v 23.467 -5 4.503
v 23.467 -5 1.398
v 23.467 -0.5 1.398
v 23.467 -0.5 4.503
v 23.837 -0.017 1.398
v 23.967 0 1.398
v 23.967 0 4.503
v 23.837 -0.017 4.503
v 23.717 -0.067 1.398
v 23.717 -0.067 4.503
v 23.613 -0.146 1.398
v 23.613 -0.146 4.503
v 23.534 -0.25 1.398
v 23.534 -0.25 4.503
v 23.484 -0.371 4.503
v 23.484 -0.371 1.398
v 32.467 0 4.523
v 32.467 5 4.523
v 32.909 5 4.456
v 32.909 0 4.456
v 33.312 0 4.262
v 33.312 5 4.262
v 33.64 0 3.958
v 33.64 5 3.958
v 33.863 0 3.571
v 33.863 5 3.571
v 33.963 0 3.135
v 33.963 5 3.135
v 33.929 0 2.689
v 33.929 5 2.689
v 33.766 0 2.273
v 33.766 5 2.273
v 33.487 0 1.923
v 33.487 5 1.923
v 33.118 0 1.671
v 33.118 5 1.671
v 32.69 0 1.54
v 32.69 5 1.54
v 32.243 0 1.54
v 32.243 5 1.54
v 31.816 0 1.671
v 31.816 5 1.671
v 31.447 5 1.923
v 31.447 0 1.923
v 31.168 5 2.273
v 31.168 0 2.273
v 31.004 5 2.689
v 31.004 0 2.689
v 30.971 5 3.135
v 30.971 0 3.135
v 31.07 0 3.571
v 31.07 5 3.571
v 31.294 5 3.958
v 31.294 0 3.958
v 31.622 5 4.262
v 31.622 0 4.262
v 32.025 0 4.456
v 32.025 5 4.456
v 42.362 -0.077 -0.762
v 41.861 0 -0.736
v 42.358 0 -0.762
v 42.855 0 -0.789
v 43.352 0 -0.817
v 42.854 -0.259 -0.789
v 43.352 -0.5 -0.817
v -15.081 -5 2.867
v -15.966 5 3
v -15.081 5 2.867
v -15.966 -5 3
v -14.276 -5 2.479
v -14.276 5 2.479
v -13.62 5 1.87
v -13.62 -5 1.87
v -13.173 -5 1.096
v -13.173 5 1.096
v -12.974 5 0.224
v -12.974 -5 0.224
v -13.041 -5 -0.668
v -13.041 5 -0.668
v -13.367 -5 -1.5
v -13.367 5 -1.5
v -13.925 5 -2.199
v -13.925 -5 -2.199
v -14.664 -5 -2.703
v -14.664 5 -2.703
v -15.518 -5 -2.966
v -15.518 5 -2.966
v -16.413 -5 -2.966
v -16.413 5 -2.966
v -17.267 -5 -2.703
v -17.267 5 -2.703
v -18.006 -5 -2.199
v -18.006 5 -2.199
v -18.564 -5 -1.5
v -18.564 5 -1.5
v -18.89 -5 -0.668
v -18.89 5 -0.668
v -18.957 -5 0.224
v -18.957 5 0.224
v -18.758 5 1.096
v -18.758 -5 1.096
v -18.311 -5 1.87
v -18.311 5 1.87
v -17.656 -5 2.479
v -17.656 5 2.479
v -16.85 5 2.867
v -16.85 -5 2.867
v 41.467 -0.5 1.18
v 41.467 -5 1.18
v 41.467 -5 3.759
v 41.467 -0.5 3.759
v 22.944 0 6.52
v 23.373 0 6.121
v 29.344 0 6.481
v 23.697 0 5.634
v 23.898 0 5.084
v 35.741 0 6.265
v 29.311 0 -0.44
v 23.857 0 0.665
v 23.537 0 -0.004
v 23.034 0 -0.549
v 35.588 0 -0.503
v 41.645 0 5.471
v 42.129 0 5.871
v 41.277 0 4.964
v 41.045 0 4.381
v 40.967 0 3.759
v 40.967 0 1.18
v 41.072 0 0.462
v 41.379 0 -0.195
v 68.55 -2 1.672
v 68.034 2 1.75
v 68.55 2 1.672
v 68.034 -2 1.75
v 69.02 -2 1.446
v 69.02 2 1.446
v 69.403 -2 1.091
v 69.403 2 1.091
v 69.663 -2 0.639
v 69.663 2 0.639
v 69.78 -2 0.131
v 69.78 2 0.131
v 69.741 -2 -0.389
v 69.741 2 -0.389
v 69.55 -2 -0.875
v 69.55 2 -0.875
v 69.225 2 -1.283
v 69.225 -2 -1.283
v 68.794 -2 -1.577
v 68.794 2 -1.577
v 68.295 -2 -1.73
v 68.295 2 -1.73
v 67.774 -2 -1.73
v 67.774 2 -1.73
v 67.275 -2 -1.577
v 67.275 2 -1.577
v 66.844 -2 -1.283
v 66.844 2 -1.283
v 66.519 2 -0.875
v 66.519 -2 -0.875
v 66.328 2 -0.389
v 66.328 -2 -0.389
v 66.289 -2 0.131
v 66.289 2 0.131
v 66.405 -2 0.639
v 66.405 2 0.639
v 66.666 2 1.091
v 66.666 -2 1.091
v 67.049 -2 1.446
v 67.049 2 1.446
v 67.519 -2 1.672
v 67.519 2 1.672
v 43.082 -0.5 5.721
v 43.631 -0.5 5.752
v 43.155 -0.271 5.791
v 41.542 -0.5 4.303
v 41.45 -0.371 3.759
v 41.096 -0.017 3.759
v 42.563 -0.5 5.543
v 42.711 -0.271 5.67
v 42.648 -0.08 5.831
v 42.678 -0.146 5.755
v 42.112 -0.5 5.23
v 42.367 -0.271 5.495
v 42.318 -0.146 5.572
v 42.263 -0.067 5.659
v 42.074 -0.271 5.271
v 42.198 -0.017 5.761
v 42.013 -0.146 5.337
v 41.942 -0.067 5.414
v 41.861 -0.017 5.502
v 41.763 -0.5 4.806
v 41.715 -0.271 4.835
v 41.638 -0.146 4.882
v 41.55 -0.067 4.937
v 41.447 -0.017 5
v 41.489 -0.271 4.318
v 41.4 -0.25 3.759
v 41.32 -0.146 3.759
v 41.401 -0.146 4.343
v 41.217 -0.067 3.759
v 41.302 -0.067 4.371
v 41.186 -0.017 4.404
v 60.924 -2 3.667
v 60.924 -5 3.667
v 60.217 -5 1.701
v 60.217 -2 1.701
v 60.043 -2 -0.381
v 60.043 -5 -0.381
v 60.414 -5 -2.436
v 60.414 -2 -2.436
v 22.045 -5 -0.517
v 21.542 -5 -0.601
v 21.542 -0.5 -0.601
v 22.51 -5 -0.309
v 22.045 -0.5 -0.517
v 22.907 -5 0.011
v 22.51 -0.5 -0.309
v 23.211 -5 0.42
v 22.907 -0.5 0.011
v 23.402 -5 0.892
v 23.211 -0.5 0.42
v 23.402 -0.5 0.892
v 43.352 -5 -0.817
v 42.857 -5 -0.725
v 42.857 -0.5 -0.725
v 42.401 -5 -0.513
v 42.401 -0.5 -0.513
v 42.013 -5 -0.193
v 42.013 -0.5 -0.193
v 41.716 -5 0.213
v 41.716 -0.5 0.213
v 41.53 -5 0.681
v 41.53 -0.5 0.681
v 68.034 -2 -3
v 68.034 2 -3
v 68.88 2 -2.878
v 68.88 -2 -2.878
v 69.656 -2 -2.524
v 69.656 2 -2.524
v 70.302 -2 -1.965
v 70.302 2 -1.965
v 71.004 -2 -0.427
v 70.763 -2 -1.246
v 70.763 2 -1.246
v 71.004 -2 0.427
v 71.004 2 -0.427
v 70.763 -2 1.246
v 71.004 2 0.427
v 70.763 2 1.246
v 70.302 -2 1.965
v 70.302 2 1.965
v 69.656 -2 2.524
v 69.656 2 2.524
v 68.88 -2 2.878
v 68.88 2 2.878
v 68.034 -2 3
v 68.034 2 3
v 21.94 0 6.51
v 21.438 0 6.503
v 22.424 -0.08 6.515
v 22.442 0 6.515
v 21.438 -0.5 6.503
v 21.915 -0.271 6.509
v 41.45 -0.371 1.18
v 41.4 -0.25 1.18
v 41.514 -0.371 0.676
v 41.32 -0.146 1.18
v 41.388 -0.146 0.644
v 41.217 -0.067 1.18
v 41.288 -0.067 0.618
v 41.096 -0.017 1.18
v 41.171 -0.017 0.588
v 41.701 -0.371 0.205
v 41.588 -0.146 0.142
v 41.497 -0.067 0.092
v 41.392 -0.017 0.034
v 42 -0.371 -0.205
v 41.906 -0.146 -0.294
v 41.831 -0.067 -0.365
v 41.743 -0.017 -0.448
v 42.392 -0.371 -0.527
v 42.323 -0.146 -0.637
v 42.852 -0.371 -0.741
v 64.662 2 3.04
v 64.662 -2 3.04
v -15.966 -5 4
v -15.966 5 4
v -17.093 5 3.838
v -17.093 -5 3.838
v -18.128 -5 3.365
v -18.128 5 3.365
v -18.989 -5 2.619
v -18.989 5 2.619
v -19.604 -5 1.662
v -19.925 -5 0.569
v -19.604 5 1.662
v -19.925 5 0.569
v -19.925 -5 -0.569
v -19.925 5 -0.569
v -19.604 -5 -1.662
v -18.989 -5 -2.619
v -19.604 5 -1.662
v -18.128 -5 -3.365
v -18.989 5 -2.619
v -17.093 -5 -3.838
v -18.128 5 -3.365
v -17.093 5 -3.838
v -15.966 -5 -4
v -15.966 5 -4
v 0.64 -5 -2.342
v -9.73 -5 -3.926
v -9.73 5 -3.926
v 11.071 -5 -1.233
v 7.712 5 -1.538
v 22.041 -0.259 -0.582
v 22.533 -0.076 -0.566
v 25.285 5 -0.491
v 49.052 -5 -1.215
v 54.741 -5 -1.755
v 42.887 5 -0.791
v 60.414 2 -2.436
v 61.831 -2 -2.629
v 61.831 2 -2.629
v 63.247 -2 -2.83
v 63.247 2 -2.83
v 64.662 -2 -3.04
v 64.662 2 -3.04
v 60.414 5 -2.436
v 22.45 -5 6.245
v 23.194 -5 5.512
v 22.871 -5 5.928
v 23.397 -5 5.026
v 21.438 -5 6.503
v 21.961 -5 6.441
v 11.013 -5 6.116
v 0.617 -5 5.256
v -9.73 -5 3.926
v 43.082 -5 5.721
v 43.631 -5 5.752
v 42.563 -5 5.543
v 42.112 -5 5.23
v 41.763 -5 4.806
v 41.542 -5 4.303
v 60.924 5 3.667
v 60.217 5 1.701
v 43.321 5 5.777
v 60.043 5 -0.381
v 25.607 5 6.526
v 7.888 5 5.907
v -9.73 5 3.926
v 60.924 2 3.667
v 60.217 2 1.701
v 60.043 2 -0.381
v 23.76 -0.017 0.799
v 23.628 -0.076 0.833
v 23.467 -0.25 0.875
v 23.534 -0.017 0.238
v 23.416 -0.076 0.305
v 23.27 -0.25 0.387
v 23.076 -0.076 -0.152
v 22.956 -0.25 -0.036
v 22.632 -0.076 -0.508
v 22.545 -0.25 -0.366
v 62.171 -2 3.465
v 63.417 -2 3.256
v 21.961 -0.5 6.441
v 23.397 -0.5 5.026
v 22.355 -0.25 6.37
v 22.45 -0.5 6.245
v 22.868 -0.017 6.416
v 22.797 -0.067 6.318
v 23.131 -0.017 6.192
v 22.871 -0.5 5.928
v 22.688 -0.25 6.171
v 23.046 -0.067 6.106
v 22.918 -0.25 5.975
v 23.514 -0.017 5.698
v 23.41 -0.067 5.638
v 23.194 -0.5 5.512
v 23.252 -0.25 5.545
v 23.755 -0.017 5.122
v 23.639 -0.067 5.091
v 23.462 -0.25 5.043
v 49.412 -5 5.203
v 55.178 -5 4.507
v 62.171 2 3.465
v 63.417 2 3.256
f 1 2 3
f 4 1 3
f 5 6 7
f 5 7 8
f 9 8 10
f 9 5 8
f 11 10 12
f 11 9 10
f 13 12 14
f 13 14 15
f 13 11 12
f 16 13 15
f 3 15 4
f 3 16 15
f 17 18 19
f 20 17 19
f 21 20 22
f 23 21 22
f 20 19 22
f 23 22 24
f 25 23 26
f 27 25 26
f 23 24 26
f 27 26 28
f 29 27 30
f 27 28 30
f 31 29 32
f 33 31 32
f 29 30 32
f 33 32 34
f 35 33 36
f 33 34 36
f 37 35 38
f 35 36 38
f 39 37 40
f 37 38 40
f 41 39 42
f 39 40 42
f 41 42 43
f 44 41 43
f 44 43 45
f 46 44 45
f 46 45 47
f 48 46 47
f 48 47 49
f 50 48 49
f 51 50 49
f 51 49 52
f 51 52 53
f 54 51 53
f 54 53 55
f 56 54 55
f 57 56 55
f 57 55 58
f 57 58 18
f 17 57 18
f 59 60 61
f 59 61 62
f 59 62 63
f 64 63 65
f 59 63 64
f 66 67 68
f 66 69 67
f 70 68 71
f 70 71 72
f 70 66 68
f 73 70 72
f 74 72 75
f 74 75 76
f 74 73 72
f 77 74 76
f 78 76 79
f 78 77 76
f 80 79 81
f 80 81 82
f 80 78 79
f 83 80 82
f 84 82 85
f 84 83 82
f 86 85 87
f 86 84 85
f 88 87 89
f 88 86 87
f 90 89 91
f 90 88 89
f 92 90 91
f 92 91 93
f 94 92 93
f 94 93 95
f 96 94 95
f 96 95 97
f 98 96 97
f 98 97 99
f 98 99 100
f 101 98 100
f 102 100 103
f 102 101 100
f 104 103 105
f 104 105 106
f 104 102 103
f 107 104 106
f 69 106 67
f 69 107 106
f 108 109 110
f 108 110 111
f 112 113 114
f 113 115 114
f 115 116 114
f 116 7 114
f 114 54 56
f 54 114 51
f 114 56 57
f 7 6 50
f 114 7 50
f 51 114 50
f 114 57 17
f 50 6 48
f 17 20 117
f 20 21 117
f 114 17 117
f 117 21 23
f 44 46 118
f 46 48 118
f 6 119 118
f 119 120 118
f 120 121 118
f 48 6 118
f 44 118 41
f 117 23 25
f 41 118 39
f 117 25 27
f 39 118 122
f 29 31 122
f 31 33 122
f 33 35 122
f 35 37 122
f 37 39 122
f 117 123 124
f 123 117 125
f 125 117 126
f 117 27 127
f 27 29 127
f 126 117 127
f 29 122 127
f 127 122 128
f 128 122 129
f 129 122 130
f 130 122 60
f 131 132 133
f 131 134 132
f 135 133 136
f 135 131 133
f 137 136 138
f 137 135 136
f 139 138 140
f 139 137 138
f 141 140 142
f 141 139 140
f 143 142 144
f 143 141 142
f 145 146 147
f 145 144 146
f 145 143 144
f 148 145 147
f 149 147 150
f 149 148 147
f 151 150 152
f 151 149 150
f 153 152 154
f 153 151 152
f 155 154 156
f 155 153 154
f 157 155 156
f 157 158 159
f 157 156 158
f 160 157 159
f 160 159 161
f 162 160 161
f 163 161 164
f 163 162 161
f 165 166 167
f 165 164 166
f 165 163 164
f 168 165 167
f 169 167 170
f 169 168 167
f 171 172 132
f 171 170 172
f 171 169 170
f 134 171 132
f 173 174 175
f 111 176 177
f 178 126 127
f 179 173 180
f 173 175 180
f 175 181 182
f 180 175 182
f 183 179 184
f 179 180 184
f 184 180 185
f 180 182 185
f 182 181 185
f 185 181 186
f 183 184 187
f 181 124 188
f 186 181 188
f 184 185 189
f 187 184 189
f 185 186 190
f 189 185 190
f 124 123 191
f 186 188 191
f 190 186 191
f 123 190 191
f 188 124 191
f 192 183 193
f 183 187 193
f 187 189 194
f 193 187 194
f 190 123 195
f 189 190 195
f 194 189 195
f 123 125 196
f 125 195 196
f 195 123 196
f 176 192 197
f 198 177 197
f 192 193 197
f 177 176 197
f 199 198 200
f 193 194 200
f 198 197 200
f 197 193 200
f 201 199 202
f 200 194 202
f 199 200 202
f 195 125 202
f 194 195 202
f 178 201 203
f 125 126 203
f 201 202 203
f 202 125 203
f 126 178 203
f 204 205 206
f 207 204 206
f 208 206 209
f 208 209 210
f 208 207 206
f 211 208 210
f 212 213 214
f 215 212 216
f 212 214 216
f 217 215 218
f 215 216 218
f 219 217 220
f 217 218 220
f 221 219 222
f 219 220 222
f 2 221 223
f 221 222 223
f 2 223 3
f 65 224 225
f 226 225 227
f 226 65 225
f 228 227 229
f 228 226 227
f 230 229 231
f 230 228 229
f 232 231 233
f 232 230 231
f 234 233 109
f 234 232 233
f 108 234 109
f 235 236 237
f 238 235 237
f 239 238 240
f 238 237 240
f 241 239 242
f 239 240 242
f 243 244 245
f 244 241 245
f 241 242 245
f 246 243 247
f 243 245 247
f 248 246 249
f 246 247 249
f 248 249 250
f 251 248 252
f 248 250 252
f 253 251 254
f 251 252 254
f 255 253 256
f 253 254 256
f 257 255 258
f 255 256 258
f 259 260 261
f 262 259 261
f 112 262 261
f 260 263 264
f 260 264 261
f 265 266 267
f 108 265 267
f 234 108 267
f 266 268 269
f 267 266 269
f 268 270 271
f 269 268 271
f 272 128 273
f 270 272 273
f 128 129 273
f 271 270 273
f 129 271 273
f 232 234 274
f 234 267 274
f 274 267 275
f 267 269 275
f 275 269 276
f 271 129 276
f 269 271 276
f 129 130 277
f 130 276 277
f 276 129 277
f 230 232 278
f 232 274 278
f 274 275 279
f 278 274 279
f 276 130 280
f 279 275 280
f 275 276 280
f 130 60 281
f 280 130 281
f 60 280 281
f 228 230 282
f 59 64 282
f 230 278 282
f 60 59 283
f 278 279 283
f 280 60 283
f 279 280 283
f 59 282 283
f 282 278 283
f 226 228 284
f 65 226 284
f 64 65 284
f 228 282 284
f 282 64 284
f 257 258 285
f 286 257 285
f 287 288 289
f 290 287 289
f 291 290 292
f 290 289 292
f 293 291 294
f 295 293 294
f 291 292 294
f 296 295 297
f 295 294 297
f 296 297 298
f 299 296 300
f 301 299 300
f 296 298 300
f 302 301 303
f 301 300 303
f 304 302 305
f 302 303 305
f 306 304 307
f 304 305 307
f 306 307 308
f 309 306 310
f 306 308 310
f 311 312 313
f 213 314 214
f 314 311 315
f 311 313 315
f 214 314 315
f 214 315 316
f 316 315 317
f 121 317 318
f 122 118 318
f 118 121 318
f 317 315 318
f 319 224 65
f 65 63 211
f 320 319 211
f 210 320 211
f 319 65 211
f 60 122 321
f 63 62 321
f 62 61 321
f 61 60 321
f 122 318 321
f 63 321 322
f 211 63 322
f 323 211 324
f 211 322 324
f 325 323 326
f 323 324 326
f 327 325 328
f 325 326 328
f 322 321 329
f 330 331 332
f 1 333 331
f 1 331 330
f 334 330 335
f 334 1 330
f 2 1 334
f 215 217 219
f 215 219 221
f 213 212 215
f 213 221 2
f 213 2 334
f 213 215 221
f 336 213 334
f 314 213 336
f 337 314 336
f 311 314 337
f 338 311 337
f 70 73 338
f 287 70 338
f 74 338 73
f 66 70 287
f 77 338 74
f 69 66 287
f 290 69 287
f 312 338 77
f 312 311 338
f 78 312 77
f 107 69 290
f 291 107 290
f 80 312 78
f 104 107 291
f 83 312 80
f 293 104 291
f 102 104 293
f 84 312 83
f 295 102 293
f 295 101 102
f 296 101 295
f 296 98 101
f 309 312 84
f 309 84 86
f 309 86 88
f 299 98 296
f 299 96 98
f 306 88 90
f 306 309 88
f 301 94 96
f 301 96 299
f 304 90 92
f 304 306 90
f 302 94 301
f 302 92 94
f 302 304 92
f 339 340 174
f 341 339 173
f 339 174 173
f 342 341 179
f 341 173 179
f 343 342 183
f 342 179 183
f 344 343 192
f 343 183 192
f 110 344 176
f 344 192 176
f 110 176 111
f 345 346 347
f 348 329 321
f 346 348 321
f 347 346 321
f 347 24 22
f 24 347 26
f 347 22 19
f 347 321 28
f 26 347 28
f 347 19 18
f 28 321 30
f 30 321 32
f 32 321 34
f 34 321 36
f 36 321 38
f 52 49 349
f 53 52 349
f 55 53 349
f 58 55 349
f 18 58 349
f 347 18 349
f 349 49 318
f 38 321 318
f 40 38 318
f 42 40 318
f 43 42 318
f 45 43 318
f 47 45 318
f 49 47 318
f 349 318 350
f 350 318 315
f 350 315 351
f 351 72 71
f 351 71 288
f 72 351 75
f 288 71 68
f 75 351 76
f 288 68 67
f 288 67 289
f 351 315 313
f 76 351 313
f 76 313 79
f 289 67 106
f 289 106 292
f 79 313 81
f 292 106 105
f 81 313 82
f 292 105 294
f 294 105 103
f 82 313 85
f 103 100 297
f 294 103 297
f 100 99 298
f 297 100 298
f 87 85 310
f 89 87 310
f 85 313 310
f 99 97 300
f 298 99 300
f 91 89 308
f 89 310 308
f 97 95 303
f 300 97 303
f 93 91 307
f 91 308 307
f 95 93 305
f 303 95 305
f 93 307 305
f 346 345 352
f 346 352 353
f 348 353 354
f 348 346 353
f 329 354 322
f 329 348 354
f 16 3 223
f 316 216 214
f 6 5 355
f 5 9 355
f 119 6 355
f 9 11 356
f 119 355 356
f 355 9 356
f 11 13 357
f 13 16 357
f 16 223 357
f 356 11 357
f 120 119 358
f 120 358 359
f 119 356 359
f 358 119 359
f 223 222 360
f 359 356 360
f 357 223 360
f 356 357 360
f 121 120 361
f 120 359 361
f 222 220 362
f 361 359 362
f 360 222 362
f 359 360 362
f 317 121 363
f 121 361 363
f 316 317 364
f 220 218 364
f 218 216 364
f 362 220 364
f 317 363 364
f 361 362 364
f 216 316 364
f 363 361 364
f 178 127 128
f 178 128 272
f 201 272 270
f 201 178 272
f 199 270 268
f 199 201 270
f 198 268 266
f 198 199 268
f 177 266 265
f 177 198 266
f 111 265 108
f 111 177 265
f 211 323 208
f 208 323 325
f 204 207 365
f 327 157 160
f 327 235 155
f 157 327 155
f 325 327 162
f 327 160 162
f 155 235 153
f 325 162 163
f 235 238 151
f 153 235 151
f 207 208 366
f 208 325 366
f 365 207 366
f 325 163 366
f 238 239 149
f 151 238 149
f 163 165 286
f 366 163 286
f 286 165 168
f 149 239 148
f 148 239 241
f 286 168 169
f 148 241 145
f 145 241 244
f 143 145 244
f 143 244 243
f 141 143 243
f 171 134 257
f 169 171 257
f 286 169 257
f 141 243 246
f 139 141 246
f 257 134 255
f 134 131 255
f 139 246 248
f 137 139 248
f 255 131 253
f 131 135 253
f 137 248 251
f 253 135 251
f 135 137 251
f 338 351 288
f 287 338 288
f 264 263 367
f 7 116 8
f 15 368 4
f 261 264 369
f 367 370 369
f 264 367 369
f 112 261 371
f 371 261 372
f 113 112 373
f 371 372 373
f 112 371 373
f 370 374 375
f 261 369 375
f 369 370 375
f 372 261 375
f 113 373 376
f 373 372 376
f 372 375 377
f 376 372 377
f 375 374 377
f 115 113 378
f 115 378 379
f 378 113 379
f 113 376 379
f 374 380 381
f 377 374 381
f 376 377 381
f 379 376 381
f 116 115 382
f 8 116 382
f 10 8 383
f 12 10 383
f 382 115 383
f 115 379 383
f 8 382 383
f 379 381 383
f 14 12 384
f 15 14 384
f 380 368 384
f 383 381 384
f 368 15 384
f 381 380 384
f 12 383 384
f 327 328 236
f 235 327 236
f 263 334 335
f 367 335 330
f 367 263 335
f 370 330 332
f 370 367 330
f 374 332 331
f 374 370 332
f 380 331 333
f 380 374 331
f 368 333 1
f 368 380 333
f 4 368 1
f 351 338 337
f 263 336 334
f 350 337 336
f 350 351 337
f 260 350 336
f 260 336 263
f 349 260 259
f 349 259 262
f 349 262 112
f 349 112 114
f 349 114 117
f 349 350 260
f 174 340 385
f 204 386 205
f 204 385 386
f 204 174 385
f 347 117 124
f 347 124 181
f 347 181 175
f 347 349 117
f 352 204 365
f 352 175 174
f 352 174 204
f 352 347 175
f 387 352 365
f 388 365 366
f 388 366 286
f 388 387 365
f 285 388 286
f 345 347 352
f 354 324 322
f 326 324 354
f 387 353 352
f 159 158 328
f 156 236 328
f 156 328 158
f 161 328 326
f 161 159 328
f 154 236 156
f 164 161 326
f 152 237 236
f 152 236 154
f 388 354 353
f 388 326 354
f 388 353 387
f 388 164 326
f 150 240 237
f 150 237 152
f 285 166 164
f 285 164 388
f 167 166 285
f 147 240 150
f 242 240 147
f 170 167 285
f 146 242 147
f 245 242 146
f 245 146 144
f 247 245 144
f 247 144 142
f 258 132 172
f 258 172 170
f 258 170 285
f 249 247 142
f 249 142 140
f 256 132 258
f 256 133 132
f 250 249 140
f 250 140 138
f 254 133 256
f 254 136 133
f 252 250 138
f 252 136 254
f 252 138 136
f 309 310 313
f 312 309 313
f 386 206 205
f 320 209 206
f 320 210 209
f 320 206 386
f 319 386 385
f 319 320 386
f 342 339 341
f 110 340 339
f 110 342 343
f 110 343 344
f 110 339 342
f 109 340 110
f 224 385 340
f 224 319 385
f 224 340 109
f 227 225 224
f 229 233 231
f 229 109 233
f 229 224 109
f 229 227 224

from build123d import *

# Parameters (mm, degrees)
SKETCH1_R               = 3
SKETCH1_R_2             = 1.75
BOSS_EXTRUDE1_DEPTH     = 5
SKETCH3_W               = 8
SKETCH3_H               = 3
SKETCH3_H_2             = 4.010495491
SKETCH4_R               = 1.5
CUT_EXTRUDE1_DEPTH      = 10
CUT_EXTRUDE3_DEPTH      = 72.508687789
CUT_EXTRUDE3_DEPTH_BACK = 72.508687789
SKETCH7_W               = 18
SKETCH7_H               = 5
FILLET2_R               = 2
FILLET3_R               = 0.5


with BuildPart() as part:
    # Sketch1 → Boss-Extrude1 (new, symmetric)
    with BuildSketch(Plane(origin=(0, 0, 0), x_dir=(1, 0, 0), z_dir=(0, 1, 0))):
        with BuildLine():
            Line((-9.729992932, 3.92576688), (-15.965575011, 4))
            ThreePointArc((-15.965575011, 4), (-19.965575011, 0), (-15.965575011, -4))
            Line((-15.965575011, -4), (-9.729992932, -3.92576688))
            ThreePointArc((-9.729992932, -3.92576688), (27.50198709, -6.510792927), (64.661875809, -3.040149395))
            Line((64.661875809, -3.040149395), (68.034424989, -3))
            ThreePointArc((68.034424989, -3), (71.034424989, 0), (68.034424989, 3))
            Line((68.034424989, 3), (64.661875809, 3.040149395))
            ThreePointArc((64.661875809, 3.040149395), (27.429895786, 0.455123348), (-9.729992932, 3.92576688))
        make_face()
        with Locations((-15.965575011, 0)):
            Circle(SKETCH1_R, mode=Mode.SUBTRACT)
        with Locations((68.034424989, 0)):
            Circle(SKETCH1_R_2, mode=Mode.SUBTRACT)
    extrude(amount=BOSS_EXTRUDE1_DEPTH, both=True)

    # Sketch3 → Cut-Revolve1 (revolve, cut)
    with BuildSketch(Plane(origin=(68.034424989, 0, 0), x_dir=(0, 0, -1), z_dir=(1, 0, 0))):
        with Locations((4, -3.5)):
            Rectangle(SKETCH3_W, SKETCH3_H)
        with Locations((4, 4.005247746)):
            Rectangle(SKETCH3_W, SKETCH3_H_2)
    revolve(axis=Axis((68.034424989, 6.010495491, 0), (0, -1, 0)), mode=Mode.SUBTRACT)

    # Sketch4 → Cut-Extrude1 (cut)
    with BuildSketch(Plane(origin=(0, 5, 0), x_dir=(1, 0, 0), z_dir=(0, 1, 0))):
        with Locations((32.466788231, -3.022809684)):
            Circle(SKETCH4_R)
    extrude(amount=-CUT_EXTRUDE1_DEPTH, mode=Mode.SUBTRACT)

    # Sketch7 → Cut-Extrude3 (cut, two sides: drawn at the far end of the back side and taken through both)
    with BuildSketch(Plane.XY.offset(-CUT_EXTRUDE3_DEPTH_BACK)):
        with Locations((32.466788231, -2.5)):
            Rectangle(SKETCH7_W, SKETCH7_H)
    extrude(amount=CUT_EXTRUDE3_DEPTH + CUT_EXTRUDE3_DEPTH_BACK, mode=Mode.SUBTRACT)

    # Fillet2
    fillet2_edges = [part.edges().sort_by_distance(p)[0] for p in [
        (23.466788231, -2.5, -0.536463963),
        (41.466788231, -2.5, -0.716531943),
        (41.466788231, -2.5, 5.919808824),
        (23.466788231, -2.5, 6.523430697),
    ]]
    fillet(fillet2_edges, radius=FILLET2_R)

    # Fillet3
    fillet3_edges = [part.edges().sort_by_distance(p)[0] for p in [
        (23.466788231, 0, 2.950599255),
        (22.870738492, 0, 5.927648567),
        (22.907277279, 0, 0.0105123),
    ]]
    fillet(fillet3_edges, radius=FILLET3_R)
    fillet3_2_edges = [part.edges().sort_by_distance(p)[0] for p in [
        (42.111819151, 0, 5.229782959),
        (41.466788231, 0, 2.469198888),
        (42.012605823, 0, -0.193392918),
    ]]
    fillet(fillet3_2_edges, radius=FILLET3_R)


solid = part.part
